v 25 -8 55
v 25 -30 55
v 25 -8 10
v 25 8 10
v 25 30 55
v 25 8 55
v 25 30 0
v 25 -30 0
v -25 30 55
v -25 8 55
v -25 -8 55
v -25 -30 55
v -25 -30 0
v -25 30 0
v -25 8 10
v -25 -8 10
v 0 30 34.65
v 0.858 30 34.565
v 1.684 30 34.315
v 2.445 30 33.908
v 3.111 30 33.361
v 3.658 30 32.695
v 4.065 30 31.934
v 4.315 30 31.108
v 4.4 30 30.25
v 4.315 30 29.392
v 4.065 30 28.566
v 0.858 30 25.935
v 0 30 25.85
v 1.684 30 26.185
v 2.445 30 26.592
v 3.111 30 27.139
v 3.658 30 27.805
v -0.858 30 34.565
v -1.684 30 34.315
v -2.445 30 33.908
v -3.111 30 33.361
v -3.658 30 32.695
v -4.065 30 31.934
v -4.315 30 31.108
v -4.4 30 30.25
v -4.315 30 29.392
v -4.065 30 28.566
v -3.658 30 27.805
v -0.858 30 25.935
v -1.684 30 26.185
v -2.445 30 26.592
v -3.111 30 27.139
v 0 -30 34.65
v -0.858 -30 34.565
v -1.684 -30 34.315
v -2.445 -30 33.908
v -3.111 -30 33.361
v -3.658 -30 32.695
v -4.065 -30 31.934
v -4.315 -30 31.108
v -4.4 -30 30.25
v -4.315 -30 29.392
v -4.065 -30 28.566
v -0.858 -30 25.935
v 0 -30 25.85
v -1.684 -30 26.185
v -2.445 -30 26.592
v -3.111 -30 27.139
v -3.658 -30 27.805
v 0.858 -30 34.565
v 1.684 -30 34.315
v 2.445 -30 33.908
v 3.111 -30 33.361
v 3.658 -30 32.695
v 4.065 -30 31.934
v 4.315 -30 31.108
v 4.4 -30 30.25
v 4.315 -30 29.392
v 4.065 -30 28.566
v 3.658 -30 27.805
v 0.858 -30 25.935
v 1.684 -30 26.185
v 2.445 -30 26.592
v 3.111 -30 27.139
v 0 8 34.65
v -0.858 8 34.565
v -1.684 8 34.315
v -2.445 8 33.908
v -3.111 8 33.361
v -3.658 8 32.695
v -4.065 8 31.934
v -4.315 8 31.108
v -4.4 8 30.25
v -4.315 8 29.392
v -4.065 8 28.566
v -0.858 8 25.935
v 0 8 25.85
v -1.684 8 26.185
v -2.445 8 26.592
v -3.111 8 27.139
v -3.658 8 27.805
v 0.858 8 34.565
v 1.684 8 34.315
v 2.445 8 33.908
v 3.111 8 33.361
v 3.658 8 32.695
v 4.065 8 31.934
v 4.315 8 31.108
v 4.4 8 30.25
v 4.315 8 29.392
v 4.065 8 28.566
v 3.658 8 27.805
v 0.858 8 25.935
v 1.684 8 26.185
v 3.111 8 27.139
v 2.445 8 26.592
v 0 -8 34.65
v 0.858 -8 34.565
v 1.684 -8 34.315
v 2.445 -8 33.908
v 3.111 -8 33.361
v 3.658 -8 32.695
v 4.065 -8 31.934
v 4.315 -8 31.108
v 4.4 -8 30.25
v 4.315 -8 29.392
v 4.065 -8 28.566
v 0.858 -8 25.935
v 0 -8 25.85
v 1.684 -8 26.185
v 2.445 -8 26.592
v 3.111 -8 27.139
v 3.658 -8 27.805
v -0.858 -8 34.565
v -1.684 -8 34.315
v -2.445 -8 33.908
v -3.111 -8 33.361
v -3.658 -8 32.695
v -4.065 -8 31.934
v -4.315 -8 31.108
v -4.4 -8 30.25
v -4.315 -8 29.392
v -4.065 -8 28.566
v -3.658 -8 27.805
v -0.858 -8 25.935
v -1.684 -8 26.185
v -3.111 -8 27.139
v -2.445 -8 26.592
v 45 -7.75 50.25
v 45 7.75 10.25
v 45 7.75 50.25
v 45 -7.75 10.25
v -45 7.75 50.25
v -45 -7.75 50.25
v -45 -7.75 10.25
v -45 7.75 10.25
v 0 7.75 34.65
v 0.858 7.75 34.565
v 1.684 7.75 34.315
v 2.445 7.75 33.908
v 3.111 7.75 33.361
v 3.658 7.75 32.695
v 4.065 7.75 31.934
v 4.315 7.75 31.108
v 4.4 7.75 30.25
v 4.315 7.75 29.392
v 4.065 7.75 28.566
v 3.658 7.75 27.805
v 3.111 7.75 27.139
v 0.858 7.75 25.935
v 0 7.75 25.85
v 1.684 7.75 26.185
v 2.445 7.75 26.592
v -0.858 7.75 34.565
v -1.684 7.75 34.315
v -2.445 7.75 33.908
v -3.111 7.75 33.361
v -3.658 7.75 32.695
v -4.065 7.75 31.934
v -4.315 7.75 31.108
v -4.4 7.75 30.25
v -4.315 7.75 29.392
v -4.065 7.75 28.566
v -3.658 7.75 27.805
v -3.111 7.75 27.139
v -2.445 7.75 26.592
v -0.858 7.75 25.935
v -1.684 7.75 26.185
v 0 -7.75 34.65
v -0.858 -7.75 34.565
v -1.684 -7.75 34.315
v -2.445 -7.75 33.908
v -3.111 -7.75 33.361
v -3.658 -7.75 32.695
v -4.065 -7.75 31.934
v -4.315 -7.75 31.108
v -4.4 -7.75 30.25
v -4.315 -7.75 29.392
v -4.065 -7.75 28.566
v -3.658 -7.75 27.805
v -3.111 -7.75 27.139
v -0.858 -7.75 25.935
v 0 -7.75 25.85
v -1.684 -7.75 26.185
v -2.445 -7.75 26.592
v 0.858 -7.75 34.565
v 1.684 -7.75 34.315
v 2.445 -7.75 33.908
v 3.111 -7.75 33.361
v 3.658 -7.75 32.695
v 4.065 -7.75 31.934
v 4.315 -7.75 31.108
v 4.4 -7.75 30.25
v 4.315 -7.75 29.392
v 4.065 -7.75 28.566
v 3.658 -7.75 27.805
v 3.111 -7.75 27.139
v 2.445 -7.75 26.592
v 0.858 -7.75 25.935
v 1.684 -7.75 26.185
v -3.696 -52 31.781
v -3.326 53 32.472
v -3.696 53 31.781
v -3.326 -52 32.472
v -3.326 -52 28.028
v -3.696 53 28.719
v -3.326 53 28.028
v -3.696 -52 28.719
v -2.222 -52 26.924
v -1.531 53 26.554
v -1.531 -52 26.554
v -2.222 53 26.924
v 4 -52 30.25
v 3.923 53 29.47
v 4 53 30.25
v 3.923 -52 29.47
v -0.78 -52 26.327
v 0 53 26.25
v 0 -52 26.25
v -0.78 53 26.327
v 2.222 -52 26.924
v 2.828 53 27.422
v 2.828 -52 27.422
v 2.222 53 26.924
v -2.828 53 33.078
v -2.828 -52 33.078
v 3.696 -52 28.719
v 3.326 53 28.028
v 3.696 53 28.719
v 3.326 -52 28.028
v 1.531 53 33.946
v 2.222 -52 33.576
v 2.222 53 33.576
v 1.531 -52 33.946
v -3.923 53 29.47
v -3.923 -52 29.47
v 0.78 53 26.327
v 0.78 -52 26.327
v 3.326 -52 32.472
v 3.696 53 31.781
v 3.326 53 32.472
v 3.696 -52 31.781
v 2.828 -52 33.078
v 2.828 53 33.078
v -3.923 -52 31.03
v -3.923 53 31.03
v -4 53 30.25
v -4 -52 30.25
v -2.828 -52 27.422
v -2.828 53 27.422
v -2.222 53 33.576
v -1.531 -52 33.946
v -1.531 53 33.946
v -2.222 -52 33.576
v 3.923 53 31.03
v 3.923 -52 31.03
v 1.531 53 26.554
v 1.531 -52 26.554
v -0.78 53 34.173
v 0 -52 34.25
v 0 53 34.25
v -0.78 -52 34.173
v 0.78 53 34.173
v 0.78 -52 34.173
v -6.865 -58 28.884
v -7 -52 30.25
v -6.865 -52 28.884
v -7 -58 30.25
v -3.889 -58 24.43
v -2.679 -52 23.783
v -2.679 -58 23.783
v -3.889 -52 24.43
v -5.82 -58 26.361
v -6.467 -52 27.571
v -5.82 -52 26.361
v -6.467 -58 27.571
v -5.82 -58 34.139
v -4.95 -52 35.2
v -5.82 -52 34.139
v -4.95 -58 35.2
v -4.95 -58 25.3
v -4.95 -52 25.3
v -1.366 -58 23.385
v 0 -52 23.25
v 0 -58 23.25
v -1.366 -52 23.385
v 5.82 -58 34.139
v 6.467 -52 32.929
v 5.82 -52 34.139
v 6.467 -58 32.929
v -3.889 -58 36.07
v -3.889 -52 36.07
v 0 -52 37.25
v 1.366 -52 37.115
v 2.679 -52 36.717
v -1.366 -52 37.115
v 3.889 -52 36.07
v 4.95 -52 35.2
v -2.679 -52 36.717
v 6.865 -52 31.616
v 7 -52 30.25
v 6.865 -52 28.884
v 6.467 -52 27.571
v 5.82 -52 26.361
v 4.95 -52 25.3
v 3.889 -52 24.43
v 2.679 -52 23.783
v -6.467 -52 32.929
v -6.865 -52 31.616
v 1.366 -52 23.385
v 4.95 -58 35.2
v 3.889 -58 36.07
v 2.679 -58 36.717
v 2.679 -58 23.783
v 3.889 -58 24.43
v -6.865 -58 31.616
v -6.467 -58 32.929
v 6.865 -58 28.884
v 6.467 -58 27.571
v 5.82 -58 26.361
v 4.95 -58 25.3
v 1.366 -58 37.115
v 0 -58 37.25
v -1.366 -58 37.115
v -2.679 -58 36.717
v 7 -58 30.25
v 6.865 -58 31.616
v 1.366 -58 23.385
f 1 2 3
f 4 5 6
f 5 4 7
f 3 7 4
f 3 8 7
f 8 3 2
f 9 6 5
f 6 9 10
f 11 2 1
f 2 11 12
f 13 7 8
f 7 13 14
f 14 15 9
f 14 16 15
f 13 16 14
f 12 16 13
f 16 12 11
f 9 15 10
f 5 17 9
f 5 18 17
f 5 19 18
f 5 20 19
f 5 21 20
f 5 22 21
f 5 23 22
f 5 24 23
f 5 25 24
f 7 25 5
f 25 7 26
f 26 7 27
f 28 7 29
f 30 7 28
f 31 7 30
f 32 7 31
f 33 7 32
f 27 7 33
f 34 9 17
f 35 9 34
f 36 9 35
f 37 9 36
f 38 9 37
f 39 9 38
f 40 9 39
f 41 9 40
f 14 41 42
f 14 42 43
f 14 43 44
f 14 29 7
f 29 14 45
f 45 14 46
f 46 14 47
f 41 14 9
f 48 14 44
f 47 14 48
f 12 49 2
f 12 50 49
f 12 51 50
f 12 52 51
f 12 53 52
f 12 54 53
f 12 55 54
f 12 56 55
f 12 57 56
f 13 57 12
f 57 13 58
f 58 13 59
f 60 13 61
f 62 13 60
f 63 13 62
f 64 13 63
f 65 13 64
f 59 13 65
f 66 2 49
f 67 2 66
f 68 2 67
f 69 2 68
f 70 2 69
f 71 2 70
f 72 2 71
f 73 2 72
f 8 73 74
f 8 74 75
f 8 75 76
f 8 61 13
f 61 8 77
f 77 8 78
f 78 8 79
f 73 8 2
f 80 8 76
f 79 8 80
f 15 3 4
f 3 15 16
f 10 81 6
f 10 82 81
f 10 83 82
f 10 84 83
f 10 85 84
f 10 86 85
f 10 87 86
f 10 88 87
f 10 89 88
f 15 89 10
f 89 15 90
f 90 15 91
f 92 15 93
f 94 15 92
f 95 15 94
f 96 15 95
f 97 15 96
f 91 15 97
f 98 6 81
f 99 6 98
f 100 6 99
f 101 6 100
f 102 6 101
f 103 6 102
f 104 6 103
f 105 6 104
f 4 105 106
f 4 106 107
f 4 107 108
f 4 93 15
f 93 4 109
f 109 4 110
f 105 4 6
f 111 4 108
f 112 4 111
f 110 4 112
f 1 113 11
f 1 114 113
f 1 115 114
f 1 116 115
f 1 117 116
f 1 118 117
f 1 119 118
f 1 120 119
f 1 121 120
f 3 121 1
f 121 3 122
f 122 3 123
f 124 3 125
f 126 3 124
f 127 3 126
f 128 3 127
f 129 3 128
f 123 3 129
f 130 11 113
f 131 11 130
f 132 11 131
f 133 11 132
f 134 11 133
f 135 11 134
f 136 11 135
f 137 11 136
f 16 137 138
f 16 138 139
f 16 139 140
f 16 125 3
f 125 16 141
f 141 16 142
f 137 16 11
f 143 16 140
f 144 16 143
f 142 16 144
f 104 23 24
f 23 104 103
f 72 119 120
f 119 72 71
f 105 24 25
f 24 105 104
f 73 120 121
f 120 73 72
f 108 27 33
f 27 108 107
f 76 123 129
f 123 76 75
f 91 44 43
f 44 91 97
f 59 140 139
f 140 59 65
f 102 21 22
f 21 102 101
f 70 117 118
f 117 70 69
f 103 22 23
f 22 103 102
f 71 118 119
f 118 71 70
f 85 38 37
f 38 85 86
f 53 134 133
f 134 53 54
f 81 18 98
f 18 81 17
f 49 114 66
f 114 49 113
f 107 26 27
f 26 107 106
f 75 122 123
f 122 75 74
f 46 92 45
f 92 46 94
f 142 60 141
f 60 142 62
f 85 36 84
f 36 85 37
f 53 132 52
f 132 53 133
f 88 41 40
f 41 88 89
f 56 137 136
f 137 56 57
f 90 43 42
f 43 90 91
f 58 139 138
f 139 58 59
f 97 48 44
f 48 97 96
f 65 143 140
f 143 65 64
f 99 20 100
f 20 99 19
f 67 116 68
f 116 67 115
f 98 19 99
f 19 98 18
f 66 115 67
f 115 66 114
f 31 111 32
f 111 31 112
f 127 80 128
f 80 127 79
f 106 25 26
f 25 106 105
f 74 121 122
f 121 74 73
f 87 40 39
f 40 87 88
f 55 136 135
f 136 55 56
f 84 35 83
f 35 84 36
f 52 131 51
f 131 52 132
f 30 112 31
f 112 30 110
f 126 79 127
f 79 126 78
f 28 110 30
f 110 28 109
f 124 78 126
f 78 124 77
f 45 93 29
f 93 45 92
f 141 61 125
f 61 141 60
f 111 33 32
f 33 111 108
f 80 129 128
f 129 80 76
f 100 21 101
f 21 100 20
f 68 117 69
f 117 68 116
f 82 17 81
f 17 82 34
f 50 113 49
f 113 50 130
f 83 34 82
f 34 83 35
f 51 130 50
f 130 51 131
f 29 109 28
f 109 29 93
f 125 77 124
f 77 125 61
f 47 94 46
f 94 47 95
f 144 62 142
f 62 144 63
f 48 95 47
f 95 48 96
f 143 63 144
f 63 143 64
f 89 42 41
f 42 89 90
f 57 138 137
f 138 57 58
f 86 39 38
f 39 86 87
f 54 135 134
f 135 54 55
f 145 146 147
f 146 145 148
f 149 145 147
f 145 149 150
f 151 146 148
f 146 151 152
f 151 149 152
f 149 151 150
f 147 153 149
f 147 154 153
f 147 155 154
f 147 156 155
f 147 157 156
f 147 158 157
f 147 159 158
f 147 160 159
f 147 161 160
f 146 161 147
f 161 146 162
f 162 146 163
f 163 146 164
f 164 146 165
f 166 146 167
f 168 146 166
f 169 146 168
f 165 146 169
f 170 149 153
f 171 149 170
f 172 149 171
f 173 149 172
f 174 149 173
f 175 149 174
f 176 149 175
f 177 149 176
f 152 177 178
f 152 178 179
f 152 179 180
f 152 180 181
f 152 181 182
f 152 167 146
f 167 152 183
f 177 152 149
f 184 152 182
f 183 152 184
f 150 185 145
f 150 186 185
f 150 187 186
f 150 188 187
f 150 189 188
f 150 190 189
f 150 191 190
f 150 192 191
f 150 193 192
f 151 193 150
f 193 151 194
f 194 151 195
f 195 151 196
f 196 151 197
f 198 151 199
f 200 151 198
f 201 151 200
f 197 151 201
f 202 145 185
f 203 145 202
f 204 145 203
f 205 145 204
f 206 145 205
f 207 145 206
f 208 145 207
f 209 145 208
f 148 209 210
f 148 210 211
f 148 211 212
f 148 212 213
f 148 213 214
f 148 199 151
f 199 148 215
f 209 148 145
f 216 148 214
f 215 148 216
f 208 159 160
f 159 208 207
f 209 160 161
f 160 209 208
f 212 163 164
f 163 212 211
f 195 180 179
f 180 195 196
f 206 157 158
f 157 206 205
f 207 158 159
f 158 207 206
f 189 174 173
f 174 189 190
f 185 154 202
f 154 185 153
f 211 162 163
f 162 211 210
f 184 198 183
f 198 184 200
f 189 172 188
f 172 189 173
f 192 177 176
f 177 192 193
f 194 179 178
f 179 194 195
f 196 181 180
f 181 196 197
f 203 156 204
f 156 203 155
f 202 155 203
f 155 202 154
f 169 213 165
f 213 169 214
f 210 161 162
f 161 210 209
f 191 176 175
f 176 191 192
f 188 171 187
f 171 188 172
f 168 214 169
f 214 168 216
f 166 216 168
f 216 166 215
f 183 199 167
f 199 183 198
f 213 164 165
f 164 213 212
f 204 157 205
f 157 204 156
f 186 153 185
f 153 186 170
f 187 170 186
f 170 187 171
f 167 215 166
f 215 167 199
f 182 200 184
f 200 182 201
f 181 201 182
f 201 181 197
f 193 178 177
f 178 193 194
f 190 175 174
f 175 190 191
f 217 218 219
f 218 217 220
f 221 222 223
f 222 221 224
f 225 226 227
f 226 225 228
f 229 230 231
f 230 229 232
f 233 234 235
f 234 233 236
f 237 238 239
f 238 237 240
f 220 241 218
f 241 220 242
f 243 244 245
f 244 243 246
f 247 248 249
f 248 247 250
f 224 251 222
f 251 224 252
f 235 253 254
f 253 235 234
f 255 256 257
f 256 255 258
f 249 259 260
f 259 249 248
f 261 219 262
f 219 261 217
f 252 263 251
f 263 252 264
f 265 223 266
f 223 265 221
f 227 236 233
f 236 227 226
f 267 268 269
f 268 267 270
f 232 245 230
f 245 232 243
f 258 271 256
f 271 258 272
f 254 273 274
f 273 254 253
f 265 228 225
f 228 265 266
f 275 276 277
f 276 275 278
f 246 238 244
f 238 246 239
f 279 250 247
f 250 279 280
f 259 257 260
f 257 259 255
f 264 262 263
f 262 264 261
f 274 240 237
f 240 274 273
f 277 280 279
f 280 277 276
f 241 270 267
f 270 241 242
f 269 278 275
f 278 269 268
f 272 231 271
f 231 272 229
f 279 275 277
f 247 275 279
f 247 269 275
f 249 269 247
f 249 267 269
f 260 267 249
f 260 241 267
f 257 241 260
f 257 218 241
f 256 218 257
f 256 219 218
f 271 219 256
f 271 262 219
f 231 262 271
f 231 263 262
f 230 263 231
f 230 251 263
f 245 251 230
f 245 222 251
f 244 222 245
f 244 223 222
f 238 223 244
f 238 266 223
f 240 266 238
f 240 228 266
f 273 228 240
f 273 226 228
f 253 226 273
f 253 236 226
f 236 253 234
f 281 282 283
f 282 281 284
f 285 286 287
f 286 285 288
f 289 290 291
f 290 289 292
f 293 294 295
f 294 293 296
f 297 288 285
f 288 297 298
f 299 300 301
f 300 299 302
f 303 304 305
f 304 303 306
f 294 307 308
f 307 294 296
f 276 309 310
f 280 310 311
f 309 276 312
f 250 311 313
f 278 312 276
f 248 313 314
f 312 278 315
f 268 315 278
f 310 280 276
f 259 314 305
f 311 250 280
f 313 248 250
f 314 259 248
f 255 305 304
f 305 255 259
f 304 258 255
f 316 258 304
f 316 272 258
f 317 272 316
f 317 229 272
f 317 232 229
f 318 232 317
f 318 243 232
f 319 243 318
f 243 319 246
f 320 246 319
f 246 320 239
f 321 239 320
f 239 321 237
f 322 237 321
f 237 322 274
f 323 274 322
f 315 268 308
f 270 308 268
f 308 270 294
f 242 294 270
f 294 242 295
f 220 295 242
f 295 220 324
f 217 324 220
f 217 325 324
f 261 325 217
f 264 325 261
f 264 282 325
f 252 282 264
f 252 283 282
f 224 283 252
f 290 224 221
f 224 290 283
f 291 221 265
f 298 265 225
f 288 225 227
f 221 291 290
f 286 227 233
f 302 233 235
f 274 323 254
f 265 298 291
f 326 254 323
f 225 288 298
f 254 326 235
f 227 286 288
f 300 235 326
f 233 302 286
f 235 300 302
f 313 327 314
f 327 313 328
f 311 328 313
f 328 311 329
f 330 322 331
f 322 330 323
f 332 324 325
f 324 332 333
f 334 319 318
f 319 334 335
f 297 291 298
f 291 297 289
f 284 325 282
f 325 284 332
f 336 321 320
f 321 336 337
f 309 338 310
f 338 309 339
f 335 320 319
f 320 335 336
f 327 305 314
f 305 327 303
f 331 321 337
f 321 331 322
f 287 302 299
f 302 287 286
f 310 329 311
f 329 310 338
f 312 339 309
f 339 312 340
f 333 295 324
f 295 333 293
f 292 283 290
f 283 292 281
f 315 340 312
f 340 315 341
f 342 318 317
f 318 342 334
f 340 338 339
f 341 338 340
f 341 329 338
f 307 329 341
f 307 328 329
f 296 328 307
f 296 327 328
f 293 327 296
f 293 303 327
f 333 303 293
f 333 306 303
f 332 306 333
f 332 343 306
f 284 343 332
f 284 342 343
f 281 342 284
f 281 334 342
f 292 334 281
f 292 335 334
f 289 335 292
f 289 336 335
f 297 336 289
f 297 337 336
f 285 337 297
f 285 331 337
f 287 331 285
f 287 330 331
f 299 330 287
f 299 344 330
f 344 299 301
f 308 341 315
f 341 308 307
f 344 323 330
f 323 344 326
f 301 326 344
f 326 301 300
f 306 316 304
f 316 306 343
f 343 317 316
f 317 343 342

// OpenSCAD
$fn = 32;

// ------------------------------------------------------------------------
// Clevis joint: 50 mm clevis, pin d8
// Every part is its own module, assembly() places them once.
// ------------------------------------------------------------------------

// --- part 1 ---
module clevis() {
  difference() {
    translate([-25, -30, 0]) cube([50, 60, 55]);
    translate([-26, -8, 10]) cube([52, 16, 46]);
    translate([0, 0, 30.25]) rotate([90, 0, 0]) cylinder(h = 62, d = 8.8, center = true);
  }
}

// --- part 2 ---
module eye() {
  difference() {
    translate([-45, -7.75, 0]) cube([90, 15.5, 40]);
    translate([0, 0, 20]) rotate([90, 0, 0]) cylinder(h = 17.5, d = 8.8, center = true);
  }
}

// --- part 3 ---
module pin() {
  rotate([0, 90, 0]) cylinder(h = 106, d = 8, center = true);
  translate([-58, 0, 0]) rotate([0, 90, 0]) cylinder(h = 6, d = 14);
}

// --- assembly ---
module assembly() {
  translate([0, 0, 0]) rotate([0, 0, 0]) clevis();
  translate([0, 0, 10.25]) rotate([0, 0, 0]) eye();
  translate([0, 0, 30.25]) rotate([0, 0, 90]) pin();
}

assembly();
